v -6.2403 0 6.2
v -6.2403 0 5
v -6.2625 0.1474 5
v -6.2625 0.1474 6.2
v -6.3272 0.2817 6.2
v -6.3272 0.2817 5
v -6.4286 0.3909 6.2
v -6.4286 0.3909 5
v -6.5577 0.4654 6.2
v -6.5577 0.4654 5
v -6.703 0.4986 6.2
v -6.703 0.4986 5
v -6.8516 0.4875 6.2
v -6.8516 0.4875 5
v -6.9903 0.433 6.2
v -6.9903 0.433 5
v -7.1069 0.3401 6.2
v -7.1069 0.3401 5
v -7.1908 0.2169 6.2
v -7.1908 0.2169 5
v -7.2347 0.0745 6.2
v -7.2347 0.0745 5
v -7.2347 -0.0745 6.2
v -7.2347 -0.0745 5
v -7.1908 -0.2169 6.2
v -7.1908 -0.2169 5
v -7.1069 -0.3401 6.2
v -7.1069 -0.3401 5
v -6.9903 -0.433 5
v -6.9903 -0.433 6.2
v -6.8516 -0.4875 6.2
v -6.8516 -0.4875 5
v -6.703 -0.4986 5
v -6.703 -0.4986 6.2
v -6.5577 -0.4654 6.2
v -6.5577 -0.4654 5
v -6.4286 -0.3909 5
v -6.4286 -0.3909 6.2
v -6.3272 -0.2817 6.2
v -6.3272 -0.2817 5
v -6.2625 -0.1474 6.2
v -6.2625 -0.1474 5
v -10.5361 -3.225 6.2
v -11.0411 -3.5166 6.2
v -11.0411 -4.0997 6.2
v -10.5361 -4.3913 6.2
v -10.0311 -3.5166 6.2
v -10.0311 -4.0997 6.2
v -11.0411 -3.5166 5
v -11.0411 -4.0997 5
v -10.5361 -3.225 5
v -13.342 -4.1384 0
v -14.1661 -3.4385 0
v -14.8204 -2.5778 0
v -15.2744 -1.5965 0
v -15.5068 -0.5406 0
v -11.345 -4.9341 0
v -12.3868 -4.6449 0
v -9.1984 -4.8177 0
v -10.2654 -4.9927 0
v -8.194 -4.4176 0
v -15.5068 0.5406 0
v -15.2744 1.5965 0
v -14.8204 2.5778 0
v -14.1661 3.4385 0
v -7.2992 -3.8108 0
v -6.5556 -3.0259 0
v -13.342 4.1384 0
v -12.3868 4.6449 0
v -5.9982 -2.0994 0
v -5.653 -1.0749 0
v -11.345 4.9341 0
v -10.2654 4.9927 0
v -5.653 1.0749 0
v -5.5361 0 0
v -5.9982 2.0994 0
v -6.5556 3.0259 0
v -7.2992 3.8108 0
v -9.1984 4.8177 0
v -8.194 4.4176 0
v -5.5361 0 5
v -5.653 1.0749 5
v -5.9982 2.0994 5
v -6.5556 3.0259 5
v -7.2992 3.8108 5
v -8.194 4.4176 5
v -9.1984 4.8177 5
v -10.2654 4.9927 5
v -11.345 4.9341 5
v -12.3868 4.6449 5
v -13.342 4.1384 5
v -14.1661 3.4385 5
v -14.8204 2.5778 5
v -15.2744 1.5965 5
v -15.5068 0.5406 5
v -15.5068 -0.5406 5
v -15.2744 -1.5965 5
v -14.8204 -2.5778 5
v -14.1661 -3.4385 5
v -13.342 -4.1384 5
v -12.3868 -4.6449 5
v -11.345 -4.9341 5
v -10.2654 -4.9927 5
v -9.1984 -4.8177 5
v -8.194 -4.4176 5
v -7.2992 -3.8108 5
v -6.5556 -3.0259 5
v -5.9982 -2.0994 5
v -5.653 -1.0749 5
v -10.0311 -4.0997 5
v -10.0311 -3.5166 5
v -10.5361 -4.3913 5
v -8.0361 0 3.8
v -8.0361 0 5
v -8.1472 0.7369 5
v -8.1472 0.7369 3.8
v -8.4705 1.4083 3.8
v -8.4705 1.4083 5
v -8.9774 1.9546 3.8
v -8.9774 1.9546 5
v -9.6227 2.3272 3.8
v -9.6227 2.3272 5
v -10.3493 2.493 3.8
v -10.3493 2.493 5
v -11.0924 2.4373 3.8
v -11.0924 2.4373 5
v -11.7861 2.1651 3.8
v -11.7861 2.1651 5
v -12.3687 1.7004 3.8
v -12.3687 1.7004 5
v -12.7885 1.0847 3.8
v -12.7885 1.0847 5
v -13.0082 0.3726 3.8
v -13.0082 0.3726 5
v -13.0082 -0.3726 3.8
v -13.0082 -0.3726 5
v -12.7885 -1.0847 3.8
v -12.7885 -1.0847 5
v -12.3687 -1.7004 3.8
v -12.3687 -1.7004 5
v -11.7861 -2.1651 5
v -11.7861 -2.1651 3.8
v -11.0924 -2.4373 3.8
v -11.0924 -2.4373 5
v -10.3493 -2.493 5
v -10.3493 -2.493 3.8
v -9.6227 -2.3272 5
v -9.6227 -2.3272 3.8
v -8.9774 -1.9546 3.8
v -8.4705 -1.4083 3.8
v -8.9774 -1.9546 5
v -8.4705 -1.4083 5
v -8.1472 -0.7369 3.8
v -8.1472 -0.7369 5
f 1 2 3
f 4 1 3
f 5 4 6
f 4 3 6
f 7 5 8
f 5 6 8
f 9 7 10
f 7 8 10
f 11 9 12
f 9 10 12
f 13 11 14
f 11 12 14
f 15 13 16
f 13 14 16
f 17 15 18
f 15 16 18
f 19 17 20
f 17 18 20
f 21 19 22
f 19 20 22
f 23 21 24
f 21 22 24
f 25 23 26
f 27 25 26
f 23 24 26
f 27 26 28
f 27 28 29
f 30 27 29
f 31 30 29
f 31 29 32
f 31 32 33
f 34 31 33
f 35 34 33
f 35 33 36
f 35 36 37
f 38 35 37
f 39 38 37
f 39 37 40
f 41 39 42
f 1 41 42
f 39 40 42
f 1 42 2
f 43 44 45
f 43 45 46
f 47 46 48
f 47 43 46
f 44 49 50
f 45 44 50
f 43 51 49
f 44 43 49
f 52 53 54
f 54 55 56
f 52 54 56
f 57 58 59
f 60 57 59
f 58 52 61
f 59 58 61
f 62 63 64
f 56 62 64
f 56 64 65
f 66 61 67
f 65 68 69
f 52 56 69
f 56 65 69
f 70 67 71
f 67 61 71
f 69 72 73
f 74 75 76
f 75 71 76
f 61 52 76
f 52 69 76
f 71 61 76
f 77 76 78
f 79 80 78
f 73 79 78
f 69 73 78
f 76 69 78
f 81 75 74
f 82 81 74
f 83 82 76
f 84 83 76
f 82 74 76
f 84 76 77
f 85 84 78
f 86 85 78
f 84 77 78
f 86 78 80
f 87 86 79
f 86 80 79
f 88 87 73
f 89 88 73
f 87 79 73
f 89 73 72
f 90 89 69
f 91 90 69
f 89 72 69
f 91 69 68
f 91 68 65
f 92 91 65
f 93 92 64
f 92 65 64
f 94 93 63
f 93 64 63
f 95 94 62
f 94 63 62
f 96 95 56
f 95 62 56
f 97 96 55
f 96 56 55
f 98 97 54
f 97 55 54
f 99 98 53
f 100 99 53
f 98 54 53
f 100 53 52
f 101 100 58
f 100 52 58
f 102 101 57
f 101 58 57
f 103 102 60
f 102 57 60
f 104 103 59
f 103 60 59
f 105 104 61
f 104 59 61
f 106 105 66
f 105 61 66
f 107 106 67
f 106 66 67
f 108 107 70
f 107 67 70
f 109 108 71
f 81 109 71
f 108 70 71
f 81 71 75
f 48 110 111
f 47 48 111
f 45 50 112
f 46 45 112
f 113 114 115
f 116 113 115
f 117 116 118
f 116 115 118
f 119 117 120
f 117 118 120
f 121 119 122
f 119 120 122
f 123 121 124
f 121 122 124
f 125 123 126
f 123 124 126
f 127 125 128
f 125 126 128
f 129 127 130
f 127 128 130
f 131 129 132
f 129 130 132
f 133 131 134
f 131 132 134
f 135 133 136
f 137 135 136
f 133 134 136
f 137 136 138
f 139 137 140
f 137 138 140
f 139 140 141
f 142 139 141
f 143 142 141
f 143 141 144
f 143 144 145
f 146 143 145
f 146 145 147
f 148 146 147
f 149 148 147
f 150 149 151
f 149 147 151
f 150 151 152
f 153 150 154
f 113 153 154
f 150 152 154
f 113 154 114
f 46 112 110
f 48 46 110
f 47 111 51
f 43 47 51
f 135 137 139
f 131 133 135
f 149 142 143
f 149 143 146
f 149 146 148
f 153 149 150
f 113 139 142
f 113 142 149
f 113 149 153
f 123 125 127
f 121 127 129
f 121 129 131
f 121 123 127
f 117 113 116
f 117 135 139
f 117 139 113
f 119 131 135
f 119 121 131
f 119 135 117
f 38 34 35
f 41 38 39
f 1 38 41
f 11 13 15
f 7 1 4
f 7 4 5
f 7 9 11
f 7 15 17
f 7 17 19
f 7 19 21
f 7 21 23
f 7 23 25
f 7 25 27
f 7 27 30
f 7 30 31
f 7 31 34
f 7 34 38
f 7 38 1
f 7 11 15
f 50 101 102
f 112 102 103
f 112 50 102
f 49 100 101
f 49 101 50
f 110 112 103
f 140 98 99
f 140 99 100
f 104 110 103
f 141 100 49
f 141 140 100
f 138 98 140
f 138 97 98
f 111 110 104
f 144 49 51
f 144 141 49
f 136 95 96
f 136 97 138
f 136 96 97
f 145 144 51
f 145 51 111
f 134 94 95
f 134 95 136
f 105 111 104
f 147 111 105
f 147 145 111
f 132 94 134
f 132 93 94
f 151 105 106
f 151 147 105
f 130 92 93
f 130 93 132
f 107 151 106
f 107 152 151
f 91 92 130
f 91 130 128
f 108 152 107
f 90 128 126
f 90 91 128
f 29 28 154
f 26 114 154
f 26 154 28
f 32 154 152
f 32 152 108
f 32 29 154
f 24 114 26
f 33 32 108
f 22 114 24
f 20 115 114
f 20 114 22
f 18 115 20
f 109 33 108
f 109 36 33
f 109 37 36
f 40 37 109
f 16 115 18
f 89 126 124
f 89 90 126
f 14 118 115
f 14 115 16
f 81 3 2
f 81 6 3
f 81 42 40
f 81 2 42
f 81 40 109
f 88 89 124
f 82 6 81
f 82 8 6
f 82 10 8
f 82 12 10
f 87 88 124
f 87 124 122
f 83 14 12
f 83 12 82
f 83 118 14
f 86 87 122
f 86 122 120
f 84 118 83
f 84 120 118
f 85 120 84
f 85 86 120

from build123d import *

# Parameters (mm, degrees)
F0_R     = 5
F1_DEPTH = 5
F2_R     = 0.5
F3_DEPTH = 1.2
F2_R_2   = 2.5
F4_DEPTH = 1.2


with BuildPart() as f1:
    # F0 (on Top) → F1 (new body)
    with BuildSketch(Plane.XY):
        with Locations((-10.536088, 0)):
            Circle(F0_R)
    extrude(amount=F1_DEPTH)

    # F2 (on face) → F3 (join)
    with BuildSketch(Plane.XY.offset(5)):
        with Locations((-6.740328, 0)):
            Circle(F2_R)
        Polygon((-10.031058, -4.099747), (-10.031058, -3.516589), (-10.536088, -3.22501), (-11.041118, -3.516589), (-11.041118, -4.099747), (-10.536088, -4.391326), align=None)
    extrude(amount=F3_DEPTH)

    # F2 (on face) → F4 (cut)
    with BuildSketch(Plane.XY.offset(5)):
        with Locations((-10.536088, 0)):
            Circle(F2_R_2)
    extrude(amount=-F4_DEPTH, mode=Mode.SUBTRACT)


solid = f1.part
